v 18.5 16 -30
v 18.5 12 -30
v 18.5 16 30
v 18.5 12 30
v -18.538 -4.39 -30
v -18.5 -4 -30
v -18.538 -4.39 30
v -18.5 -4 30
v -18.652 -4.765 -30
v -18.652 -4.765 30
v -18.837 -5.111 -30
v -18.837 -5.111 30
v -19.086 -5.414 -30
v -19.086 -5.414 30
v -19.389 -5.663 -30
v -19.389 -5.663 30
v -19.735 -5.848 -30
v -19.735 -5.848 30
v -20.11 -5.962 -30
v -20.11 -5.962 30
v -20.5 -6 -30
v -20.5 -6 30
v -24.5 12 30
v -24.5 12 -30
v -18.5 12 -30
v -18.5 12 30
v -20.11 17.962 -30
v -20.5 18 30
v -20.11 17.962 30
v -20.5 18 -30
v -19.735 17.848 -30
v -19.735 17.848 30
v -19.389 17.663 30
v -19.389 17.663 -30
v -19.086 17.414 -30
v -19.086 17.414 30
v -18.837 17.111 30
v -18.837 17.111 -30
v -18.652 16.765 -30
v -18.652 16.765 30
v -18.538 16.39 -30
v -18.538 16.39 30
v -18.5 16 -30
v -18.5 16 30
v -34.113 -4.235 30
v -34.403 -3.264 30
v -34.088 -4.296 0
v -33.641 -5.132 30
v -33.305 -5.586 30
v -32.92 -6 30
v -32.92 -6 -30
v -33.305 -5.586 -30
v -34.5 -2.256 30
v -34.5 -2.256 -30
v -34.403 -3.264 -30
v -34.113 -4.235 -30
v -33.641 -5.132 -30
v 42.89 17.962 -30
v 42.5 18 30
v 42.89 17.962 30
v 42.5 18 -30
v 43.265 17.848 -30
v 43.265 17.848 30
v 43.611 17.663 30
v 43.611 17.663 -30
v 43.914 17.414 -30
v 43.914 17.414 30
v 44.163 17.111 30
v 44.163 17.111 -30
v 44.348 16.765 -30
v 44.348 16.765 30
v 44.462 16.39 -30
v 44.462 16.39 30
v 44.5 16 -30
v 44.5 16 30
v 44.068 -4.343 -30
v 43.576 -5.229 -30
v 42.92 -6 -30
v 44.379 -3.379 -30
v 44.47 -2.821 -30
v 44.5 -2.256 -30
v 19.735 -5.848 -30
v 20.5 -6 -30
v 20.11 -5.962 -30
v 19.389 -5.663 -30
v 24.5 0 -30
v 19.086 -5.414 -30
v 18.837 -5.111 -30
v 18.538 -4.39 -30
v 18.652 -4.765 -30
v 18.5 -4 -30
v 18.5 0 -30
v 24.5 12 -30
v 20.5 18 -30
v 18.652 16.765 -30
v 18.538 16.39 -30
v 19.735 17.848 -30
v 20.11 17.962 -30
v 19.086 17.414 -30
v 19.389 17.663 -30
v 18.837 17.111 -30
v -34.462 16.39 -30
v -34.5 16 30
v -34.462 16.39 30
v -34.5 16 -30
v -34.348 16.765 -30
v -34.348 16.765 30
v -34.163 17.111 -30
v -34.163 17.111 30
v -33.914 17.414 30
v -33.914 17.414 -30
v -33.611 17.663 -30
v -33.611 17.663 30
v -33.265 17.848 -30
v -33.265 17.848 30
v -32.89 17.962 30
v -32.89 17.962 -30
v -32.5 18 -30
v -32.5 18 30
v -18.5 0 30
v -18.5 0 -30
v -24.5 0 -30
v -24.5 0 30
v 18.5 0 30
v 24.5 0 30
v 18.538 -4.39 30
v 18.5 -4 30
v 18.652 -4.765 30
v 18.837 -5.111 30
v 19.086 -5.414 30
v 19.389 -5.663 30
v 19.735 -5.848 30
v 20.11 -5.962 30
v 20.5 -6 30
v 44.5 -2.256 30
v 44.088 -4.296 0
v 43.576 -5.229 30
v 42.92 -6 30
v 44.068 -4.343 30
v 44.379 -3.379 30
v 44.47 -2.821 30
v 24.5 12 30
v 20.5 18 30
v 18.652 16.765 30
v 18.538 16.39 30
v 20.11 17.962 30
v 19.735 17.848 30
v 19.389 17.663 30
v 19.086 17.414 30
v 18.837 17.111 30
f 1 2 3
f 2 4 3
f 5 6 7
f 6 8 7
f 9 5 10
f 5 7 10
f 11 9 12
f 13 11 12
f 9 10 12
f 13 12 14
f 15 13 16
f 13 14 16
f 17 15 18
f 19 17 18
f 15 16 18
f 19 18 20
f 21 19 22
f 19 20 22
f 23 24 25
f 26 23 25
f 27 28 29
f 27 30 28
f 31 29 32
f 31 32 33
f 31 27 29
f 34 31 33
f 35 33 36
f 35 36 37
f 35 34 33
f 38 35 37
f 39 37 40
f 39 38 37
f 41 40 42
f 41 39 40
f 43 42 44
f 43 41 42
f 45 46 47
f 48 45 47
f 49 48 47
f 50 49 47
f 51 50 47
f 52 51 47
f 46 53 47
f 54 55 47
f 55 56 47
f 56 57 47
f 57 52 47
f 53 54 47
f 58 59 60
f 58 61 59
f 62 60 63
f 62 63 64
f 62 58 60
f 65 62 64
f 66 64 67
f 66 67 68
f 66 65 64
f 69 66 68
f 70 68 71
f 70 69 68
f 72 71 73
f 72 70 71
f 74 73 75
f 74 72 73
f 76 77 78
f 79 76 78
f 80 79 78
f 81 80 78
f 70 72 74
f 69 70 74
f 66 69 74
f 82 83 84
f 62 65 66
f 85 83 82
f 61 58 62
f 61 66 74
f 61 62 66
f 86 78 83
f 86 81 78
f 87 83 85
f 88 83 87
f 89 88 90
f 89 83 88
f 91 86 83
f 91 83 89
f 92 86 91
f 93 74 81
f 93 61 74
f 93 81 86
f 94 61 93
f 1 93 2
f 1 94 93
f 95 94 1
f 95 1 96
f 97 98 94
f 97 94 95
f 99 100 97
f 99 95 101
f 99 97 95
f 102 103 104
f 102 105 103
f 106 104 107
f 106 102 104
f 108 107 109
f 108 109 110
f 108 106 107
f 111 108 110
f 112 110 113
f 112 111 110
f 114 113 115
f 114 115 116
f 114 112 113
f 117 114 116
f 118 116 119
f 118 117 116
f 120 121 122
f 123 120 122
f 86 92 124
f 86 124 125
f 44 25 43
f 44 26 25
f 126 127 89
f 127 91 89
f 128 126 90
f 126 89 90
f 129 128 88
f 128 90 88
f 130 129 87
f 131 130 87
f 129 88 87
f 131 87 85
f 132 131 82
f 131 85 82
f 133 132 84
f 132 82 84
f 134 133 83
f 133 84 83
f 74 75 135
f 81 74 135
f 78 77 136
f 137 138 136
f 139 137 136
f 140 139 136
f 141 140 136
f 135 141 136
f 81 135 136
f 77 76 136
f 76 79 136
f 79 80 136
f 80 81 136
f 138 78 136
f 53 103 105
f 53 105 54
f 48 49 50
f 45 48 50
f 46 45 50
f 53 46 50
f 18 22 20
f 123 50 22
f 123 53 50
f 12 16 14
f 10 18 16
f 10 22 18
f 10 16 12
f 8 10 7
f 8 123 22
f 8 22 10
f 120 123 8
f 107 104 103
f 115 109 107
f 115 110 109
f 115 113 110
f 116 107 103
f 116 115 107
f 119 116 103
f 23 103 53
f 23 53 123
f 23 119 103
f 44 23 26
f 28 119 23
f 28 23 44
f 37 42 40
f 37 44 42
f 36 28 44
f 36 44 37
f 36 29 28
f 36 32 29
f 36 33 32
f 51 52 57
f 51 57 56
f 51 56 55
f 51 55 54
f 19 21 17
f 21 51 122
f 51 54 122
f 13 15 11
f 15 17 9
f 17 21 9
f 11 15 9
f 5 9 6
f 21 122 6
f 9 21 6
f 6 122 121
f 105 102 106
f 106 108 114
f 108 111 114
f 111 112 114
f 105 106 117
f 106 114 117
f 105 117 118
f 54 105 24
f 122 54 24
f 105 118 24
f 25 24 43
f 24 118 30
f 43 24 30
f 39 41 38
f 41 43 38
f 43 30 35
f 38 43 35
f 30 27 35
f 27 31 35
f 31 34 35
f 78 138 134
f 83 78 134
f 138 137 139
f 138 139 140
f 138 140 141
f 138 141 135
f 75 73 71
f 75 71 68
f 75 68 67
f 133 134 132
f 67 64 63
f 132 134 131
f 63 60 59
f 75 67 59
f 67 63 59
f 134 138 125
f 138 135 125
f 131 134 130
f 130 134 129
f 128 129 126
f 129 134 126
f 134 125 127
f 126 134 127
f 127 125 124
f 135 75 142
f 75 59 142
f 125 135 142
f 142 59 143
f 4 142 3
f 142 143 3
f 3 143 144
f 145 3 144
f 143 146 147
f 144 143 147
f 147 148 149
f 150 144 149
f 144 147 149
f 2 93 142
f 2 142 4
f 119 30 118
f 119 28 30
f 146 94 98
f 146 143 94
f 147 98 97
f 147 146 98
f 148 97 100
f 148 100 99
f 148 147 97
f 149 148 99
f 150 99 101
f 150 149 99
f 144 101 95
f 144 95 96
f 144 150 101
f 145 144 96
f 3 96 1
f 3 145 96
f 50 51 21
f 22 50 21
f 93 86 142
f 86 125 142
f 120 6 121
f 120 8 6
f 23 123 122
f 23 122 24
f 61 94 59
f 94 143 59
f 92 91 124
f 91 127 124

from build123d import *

# Parameters (mm, degrees)
BOSS_EXTRUDE1_DEPTH     = 30
BOSS_EXTRUDE1_2_DEPTH   = 30
FILLET1_R               = 2
FILLET2_R               = 2
CUT_EXTRUDE1_DEPTH      = 77.839117642
CUT_EXTRUDE1_DEPTH_BACK = 77.839117642


with BuildPart() as part:
    # Sketch1 → Boss-Extrude1 (new, symmetric)
    with BuildSketch(Plane.XY):
        Polygon((18.5, 18), (44.5, 18), (44.5, -6), (18.5, -6), (18.5, 0), (24.5, 0), (24.5, 12), (18.5, 12), align=None)
    extrude(amount=BOSS_EXTRUDE1_DEPTH, both=True)

    # Fillet2
    fillet2_edges = [part.edges().sort_by_distance(p)[0] for p in [
        (18.5, 18, 0),
        (44.5, 18, 0),
        (18.5, -6, 0),
    ]]
    fillet(fillet2_edges, radius=FILLET2_R)


with BuildPart() as body_2:
    # Sketch1 → Boss-Extrude1 2 (new, symmetric)
    with BuildSketch(Plane.XY):
        Polygon((-34.5, 18), (-34.5, -6), (-18.5, -6), (-18.5, 0), (-24.5, 0), (-24.5, 12), (-18.5, 12), (-18.5, 18), align=None)
    extrude(amount=BOSS_EXTRUDE1_2_DEPTH, both=True)

    # Fillet1
    fillet1_edges = [body_2.edges().sort_by_distance(p)[0] for p in [
        (-18.5, -6, 0),
        (-34.5, 18, 0),
        (-18.5, 18, 0),
    ]]
    fillet(fillet1_edges, radius=FILLET1_R)


with BuildPart() as cut_extrude1_tool:
    # Sketch2 → Cut-Extrude1 (new, two sides: drawn at the far end of the back side and taken through both)
    with BuildSketch(Plane(origin=(0, 0, -30), x_dir=(-1, 0, 0), z_dir=(0, 0, -1)).offset(-CUT_EXTRUDE1_DEPTH_BACK)):
        with BuildLine():
            Line((-44.5, -2.256209937), (-44.5, -6))
            Line((-44.5, -6), (-42.919986213, -6))
            add(Edge.make_bspline(
                [(-44.5, -2.256209937), (-44.5, -4.479366821), (-42.919986213, -6)],
                knots=[4.71238898, 4.71238898, 4.71238898, 5.529957107, 5.529957107, 5.529957107], degree=2, weights=[1, 0.917604829, 1]))
        make_face()
        with BuildLine():
            Line((32.919986213, -6), (34.5, -6))
            Line((34.5, -6), (34.5, -2.256209937))
            add(Edge.make_bspline(
                [(32.919986213, -6), (34.5, -4.479366821), (34.5, -2.256209937)],
                knots=[3.894820854, 3.894820854, 3.894820854, 4.71238898, 4.71238898, 4.71238898], degree=2, weights=[1, 0.917604829, 1]))
        make_face()
    extrude(amount=CUT_EXTRUDE1_DEPTH + CUT_EXTRUDE1_DEPTH_BACK)


with BuildPart() as part_1:
    add(part.part)

    # Cut-Extrude1: cut by cut_extrude1_tool
    add(cut_extrude1_tool.part, mode=Mode.SUBTRACT)


with BuildPart() as body_2_1:
    add(body_2.part)

    # Cut-Extrude1: cut by cut_extrude1_tool
    add(cut_extrude1_tool.part, mode=Mode.SUBTRACT)


solid = Compound([part_1.part, body_2_1.part])
